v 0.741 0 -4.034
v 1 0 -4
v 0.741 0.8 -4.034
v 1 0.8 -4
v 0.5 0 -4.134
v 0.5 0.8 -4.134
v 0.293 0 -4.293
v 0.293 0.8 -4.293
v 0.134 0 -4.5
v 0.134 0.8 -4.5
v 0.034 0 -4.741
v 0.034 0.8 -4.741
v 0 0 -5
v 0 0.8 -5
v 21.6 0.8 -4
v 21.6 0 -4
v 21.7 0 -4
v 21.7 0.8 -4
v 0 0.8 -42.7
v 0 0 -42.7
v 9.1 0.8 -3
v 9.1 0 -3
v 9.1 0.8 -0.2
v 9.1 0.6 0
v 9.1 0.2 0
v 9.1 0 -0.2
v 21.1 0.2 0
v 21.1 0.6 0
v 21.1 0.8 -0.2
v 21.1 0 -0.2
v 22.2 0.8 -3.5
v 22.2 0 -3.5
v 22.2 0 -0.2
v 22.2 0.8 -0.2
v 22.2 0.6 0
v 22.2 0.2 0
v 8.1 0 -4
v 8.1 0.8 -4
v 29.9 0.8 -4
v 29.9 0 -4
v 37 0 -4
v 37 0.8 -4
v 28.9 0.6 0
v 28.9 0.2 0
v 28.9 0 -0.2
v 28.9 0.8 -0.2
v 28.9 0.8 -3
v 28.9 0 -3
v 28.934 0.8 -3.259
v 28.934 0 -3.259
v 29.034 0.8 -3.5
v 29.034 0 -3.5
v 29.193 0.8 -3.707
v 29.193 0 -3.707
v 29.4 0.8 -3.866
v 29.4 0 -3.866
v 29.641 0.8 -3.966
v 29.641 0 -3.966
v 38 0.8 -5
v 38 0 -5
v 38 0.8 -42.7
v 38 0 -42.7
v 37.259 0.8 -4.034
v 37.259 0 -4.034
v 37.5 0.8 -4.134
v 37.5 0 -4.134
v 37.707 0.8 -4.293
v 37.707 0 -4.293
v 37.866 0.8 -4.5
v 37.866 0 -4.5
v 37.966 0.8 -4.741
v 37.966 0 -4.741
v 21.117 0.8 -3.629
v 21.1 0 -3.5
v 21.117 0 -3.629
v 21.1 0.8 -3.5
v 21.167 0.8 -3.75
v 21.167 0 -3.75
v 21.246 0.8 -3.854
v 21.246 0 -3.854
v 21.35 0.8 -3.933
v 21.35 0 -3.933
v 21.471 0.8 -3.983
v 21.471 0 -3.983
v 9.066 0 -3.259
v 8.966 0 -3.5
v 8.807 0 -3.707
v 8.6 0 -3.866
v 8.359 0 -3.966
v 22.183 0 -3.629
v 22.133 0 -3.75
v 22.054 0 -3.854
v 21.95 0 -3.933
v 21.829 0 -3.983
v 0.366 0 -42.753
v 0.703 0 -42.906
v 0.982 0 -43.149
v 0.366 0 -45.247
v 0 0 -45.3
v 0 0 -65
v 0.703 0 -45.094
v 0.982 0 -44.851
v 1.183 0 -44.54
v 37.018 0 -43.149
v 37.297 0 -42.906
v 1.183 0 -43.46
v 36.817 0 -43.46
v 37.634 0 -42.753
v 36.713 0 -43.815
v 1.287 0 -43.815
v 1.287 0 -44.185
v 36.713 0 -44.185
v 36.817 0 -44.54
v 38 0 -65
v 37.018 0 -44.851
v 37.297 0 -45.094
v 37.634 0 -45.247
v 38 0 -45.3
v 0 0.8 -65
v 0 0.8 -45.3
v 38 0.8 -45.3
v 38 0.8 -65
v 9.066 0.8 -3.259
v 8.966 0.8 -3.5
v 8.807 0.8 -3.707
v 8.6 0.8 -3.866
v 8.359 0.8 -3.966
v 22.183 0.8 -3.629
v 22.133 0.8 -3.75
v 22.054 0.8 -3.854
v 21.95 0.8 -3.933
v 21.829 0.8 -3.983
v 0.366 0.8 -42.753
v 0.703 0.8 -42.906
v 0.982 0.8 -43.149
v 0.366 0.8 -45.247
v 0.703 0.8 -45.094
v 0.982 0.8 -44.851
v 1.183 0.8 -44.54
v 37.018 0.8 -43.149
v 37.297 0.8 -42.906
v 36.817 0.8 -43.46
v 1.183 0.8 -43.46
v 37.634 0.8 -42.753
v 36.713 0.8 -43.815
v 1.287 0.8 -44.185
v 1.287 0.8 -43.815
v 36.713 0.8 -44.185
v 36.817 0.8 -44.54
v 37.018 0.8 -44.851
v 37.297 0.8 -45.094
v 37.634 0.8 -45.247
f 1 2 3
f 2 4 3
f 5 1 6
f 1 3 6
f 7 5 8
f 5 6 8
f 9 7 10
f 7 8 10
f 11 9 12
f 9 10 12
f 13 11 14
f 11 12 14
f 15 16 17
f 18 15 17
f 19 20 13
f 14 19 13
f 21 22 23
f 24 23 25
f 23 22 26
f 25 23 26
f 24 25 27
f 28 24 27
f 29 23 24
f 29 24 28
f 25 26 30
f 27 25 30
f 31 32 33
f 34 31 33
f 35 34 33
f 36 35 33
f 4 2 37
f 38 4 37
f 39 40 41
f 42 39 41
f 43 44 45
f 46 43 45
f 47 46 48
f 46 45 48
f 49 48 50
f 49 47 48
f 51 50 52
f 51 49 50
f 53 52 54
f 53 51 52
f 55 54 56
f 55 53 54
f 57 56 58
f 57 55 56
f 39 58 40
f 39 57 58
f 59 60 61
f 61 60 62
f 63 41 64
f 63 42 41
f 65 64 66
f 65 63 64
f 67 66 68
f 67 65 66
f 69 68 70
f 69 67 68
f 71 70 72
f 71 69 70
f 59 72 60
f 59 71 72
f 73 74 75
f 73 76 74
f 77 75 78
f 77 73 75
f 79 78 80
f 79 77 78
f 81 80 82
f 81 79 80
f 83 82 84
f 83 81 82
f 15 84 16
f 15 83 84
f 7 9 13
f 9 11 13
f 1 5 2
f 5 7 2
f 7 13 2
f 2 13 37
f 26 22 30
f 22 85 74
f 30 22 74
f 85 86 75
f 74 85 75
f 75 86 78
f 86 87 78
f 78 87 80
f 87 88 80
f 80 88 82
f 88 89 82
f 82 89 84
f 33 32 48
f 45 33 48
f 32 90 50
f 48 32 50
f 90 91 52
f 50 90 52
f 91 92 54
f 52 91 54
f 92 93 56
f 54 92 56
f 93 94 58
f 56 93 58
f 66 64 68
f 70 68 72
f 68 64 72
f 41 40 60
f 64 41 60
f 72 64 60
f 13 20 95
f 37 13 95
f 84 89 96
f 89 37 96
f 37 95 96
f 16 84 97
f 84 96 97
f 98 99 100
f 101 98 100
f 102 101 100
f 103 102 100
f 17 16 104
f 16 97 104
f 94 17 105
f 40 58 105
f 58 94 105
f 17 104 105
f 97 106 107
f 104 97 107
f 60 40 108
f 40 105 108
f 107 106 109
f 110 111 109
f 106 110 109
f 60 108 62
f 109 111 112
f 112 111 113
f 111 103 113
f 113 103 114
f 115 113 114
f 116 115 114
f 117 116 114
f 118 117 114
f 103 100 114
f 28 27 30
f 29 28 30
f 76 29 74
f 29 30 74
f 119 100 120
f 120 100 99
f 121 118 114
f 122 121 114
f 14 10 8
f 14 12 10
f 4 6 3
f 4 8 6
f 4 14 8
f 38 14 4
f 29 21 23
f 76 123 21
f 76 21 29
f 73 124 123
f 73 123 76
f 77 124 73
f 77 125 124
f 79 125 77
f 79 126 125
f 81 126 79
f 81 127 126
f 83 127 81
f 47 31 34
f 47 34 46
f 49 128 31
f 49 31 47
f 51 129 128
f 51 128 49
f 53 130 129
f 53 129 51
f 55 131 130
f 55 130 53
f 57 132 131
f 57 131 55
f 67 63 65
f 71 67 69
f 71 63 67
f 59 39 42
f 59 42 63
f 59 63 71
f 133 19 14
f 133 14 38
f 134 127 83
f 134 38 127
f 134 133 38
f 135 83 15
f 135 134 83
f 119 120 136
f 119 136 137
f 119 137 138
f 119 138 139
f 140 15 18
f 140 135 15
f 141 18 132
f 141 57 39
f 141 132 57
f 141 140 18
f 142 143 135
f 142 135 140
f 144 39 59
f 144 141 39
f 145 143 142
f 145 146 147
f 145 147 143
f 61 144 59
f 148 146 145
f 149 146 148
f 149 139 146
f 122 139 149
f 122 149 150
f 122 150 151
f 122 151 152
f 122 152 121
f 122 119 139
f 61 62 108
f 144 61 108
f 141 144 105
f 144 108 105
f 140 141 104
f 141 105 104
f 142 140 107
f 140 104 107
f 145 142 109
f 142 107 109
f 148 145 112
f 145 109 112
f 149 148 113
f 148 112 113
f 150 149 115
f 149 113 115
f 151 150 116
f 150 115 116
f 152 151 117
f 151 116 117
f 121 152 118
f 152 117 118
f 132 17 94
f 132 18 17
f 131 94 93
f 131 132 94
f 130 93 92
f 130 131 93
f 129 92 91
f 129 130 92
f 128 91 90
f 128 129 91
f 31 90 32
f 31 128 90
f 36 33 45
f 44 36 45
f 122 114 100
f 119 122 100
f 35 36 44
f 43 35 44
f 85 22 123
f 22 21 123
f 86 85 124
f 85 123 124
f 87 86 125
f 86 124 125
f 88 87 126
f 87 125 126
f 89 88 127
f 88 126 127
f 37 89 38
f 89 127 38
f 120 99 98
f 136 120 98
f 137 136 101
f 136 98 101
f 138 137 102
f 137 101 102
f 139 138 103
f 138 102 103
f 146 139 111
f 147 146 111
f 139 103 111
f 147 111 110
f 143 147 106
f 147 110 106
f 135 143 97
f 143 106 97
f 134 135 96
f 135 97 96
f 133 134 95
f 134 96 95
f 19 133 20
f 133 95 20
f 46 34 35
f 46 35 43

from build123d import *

# Parameters (mm, degrees)
BOSS_EXTRUDE1_DEPTH = 0.8
CHAMFER1_SIZE       = 0.2
FILLET1_R           = 1
FILLET2_R           = 0.5


with BuildPart() as part:
    # Sketch1 → Boss-Extrude1 (new body)
    with BuildSketch(Plane(origin=(0, 0, 0), x_dir=(1, 0, 0), z_dir=(0, 1, 0))):
        with BuildLine():
            Line((9.1, 0), (21.1, 0))
            Line((21.1, 0), (21.1, 4))
            Line((21.1, 4), (22.2, 4))
            Line((22.2, 4), (22.2, 0))
            Line((22.2, 0), (28.9, 0))
            Line((28.9, 0), (28.9, 4))
            Line((28.9, 4), (38, 4))
            Line((38, 4), (38, 42.7))
            ThreePointArc((38, 42.7), (36.7, 44), (38, 45.3))
            Line((38, 45.3), (38, 65))
            Line((38, 65), (0, 65))
            Line((0, 65), (0, 45.3))
            ThreePointArc((0, 45.3), (1.3, 44), (0, 42.7))
            Line((0, 42.7), (0, 4))
            Line((0, 4), (9.1, 4))
            Line((9.1, 4), (9.1, 0))
        make_face()
    extrude(amount=BOSS_EXTRUDE1_DEPTH)

    # Chamfer1
    chamfer1_edges = [part.edges().sort_by_distance(p)[0] for p in [
        (25.55, 0, 0),
        (15.1, 0, 0),
        (15.1, 0.8, 0),
        (25.55, 0.8, 0),
    ]]
    chamfer(chamfer1_edges, length=CHAMFER1_SIZE)

    # Fillet1
    fillet1_edges = [part.edges().sort_by_distance(p)[0] for p in [
        (38, 0.4, -4),
        (28.9, 0.4, -4),
        (9.1, 0.4, -4),
        (0, 0.4, -4),
    ]]
    fillet(fillet1_edges, radius=FILLET1_R)

    # Fillet2
    fillet2_edges = [part.edges().sort_by_distance(p)[0] for p in [
        (22.2, 0.4, -4),
        (21.1, 0.4, -4),
    ]]
    fillet(fillet2_edges, radius=FILLET2_R)


solid = part.part
